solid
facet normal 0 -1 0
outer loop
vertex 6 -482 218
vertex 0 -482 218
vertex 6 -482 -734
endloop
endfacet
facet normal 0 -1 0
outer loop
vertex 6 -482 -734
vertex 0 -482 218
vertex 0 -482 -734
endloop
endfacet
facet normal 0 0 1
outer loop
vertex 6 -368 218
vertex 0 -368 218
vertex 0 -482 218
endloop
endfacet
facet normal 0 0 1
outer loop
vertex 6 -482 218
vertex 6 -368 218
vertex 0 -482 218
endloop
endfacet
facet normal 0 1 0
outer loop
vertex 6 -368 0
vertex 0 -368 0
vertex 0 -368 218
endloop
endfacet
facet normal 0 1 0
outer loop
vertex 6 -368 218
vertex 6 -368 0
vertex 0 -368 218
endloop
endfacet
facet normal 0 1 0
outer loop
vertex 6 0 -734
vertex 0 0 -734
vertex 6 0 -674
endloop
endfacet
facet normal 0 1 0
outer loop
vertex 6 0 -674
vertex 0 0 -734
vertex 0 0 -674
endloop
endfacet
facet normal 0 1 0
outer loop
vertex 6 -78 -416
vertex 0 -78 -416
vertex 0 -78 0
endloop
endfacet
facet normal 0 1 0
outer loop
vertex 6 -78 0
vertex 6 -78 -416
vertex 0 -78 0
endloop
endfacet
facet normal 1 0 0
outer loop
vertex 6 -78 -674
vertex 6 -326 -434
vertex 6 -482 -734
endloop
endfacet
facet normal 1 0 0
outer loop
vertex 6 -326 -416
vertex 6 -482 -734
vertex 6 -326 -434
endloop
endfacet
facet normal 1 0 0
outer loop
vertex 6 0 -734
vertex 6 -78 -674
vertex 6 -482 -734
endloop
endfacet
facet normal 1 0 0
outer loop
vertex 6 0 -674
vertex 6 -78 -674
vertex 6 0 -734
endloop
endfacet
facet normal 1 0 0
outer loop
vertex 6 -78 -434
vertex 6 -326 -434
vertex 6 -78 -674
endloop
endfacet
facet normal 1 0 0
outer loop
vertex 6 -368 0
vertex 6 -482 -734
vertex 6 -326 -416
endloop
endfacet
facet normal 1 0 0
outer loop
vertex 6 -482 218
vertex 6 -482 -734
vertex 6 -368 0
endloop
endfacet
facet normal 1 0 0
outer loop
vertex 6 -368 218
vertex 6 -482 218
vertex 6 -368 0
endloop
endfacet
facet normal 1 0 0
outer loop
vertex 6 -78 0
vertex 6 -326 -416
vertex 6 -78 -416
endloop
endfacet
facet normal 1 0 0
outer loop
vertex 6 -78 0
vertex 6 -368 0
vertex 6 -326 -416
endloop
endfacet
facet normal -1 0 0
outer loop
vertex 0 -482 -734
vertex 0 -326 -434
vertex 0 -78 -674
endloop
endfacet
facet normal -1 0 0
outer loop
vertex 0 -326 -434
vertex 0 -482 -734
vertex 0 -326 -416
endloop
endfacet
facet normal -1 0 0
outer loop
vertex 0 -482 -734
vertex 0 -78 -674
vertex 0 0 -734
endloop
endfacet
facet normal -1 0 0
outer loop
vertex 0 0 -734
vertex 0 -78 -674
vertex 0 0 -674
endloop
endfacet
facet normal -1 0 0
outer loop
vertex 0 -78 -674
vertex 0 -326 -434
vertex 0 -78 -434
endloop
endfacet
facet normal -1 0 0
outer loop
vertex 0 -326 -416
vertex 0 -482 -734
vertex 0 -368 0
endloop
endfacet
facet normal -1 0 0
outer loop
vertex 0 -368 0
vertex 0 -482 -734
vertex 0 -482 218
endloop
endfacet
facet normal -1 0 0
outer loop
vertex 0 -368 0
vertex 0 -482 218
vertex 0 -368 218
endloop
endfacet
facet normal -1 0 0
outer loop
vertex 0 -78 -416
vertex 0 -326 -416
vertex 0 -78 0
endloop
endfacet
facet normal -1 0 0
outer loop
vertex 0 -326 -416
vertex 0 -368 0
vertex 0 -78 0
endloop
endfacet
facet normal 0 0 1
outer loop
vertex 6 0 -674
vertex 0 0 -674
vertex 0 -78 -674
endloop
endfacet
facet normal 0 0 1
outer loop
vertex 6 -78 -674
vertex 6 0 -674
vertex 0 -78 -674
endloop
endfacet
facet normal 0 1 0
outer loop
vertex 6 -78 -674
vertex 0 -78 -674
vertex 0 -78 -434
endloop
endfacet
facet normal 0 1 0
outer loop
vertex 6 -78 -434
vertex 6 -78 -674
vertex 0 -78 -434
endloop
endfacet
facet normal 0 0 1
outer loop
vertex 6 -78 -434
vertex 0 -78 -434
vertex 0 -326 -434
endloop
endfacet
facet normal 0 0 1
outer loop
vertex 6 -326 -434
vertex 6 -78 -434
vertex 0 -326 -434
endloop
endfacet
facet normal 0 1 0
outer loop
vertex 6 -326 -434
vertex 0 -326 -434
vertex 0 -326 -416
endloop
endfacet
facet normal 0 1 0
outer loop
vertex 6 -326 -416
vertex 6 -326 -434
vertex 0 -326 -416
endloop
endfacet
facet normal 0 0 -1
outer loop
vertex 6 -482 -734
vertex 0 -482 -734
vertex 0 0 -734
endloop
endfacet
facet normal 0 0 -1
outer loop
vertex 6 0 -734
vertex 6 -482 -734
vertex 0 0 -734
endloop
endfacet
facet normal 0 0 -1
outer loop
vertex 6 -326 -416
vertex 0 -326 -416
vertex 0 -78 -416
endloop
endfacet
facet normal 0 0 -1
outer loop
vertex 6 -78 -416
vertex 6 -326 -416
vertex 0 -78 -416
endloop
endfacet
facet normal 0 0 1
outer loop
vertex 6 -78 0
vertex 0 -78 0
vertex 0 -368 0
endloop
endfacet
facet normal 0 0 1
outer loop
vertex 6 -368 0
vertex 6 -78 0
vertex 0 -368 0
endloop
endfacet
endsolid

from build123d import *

# Parameters (mm, degrees)
F1_DEPTH = 6


with BuildPart() as f1:
    # F0 (on Right) → F1 (new body)
    with BuildSketch(Plane.YZ):
        Polygon((-368, 218), (-482, 218), (-482, -734), (0, -734), (0, -674), (-60, -674), (-78, -674), (-78, -434), (-326, -434), (-326, -416), (-78, -416), (-78, 0), (-368, 0), align=None)
    extrude(amount=F1_DEPTH)


solid = f1.part
